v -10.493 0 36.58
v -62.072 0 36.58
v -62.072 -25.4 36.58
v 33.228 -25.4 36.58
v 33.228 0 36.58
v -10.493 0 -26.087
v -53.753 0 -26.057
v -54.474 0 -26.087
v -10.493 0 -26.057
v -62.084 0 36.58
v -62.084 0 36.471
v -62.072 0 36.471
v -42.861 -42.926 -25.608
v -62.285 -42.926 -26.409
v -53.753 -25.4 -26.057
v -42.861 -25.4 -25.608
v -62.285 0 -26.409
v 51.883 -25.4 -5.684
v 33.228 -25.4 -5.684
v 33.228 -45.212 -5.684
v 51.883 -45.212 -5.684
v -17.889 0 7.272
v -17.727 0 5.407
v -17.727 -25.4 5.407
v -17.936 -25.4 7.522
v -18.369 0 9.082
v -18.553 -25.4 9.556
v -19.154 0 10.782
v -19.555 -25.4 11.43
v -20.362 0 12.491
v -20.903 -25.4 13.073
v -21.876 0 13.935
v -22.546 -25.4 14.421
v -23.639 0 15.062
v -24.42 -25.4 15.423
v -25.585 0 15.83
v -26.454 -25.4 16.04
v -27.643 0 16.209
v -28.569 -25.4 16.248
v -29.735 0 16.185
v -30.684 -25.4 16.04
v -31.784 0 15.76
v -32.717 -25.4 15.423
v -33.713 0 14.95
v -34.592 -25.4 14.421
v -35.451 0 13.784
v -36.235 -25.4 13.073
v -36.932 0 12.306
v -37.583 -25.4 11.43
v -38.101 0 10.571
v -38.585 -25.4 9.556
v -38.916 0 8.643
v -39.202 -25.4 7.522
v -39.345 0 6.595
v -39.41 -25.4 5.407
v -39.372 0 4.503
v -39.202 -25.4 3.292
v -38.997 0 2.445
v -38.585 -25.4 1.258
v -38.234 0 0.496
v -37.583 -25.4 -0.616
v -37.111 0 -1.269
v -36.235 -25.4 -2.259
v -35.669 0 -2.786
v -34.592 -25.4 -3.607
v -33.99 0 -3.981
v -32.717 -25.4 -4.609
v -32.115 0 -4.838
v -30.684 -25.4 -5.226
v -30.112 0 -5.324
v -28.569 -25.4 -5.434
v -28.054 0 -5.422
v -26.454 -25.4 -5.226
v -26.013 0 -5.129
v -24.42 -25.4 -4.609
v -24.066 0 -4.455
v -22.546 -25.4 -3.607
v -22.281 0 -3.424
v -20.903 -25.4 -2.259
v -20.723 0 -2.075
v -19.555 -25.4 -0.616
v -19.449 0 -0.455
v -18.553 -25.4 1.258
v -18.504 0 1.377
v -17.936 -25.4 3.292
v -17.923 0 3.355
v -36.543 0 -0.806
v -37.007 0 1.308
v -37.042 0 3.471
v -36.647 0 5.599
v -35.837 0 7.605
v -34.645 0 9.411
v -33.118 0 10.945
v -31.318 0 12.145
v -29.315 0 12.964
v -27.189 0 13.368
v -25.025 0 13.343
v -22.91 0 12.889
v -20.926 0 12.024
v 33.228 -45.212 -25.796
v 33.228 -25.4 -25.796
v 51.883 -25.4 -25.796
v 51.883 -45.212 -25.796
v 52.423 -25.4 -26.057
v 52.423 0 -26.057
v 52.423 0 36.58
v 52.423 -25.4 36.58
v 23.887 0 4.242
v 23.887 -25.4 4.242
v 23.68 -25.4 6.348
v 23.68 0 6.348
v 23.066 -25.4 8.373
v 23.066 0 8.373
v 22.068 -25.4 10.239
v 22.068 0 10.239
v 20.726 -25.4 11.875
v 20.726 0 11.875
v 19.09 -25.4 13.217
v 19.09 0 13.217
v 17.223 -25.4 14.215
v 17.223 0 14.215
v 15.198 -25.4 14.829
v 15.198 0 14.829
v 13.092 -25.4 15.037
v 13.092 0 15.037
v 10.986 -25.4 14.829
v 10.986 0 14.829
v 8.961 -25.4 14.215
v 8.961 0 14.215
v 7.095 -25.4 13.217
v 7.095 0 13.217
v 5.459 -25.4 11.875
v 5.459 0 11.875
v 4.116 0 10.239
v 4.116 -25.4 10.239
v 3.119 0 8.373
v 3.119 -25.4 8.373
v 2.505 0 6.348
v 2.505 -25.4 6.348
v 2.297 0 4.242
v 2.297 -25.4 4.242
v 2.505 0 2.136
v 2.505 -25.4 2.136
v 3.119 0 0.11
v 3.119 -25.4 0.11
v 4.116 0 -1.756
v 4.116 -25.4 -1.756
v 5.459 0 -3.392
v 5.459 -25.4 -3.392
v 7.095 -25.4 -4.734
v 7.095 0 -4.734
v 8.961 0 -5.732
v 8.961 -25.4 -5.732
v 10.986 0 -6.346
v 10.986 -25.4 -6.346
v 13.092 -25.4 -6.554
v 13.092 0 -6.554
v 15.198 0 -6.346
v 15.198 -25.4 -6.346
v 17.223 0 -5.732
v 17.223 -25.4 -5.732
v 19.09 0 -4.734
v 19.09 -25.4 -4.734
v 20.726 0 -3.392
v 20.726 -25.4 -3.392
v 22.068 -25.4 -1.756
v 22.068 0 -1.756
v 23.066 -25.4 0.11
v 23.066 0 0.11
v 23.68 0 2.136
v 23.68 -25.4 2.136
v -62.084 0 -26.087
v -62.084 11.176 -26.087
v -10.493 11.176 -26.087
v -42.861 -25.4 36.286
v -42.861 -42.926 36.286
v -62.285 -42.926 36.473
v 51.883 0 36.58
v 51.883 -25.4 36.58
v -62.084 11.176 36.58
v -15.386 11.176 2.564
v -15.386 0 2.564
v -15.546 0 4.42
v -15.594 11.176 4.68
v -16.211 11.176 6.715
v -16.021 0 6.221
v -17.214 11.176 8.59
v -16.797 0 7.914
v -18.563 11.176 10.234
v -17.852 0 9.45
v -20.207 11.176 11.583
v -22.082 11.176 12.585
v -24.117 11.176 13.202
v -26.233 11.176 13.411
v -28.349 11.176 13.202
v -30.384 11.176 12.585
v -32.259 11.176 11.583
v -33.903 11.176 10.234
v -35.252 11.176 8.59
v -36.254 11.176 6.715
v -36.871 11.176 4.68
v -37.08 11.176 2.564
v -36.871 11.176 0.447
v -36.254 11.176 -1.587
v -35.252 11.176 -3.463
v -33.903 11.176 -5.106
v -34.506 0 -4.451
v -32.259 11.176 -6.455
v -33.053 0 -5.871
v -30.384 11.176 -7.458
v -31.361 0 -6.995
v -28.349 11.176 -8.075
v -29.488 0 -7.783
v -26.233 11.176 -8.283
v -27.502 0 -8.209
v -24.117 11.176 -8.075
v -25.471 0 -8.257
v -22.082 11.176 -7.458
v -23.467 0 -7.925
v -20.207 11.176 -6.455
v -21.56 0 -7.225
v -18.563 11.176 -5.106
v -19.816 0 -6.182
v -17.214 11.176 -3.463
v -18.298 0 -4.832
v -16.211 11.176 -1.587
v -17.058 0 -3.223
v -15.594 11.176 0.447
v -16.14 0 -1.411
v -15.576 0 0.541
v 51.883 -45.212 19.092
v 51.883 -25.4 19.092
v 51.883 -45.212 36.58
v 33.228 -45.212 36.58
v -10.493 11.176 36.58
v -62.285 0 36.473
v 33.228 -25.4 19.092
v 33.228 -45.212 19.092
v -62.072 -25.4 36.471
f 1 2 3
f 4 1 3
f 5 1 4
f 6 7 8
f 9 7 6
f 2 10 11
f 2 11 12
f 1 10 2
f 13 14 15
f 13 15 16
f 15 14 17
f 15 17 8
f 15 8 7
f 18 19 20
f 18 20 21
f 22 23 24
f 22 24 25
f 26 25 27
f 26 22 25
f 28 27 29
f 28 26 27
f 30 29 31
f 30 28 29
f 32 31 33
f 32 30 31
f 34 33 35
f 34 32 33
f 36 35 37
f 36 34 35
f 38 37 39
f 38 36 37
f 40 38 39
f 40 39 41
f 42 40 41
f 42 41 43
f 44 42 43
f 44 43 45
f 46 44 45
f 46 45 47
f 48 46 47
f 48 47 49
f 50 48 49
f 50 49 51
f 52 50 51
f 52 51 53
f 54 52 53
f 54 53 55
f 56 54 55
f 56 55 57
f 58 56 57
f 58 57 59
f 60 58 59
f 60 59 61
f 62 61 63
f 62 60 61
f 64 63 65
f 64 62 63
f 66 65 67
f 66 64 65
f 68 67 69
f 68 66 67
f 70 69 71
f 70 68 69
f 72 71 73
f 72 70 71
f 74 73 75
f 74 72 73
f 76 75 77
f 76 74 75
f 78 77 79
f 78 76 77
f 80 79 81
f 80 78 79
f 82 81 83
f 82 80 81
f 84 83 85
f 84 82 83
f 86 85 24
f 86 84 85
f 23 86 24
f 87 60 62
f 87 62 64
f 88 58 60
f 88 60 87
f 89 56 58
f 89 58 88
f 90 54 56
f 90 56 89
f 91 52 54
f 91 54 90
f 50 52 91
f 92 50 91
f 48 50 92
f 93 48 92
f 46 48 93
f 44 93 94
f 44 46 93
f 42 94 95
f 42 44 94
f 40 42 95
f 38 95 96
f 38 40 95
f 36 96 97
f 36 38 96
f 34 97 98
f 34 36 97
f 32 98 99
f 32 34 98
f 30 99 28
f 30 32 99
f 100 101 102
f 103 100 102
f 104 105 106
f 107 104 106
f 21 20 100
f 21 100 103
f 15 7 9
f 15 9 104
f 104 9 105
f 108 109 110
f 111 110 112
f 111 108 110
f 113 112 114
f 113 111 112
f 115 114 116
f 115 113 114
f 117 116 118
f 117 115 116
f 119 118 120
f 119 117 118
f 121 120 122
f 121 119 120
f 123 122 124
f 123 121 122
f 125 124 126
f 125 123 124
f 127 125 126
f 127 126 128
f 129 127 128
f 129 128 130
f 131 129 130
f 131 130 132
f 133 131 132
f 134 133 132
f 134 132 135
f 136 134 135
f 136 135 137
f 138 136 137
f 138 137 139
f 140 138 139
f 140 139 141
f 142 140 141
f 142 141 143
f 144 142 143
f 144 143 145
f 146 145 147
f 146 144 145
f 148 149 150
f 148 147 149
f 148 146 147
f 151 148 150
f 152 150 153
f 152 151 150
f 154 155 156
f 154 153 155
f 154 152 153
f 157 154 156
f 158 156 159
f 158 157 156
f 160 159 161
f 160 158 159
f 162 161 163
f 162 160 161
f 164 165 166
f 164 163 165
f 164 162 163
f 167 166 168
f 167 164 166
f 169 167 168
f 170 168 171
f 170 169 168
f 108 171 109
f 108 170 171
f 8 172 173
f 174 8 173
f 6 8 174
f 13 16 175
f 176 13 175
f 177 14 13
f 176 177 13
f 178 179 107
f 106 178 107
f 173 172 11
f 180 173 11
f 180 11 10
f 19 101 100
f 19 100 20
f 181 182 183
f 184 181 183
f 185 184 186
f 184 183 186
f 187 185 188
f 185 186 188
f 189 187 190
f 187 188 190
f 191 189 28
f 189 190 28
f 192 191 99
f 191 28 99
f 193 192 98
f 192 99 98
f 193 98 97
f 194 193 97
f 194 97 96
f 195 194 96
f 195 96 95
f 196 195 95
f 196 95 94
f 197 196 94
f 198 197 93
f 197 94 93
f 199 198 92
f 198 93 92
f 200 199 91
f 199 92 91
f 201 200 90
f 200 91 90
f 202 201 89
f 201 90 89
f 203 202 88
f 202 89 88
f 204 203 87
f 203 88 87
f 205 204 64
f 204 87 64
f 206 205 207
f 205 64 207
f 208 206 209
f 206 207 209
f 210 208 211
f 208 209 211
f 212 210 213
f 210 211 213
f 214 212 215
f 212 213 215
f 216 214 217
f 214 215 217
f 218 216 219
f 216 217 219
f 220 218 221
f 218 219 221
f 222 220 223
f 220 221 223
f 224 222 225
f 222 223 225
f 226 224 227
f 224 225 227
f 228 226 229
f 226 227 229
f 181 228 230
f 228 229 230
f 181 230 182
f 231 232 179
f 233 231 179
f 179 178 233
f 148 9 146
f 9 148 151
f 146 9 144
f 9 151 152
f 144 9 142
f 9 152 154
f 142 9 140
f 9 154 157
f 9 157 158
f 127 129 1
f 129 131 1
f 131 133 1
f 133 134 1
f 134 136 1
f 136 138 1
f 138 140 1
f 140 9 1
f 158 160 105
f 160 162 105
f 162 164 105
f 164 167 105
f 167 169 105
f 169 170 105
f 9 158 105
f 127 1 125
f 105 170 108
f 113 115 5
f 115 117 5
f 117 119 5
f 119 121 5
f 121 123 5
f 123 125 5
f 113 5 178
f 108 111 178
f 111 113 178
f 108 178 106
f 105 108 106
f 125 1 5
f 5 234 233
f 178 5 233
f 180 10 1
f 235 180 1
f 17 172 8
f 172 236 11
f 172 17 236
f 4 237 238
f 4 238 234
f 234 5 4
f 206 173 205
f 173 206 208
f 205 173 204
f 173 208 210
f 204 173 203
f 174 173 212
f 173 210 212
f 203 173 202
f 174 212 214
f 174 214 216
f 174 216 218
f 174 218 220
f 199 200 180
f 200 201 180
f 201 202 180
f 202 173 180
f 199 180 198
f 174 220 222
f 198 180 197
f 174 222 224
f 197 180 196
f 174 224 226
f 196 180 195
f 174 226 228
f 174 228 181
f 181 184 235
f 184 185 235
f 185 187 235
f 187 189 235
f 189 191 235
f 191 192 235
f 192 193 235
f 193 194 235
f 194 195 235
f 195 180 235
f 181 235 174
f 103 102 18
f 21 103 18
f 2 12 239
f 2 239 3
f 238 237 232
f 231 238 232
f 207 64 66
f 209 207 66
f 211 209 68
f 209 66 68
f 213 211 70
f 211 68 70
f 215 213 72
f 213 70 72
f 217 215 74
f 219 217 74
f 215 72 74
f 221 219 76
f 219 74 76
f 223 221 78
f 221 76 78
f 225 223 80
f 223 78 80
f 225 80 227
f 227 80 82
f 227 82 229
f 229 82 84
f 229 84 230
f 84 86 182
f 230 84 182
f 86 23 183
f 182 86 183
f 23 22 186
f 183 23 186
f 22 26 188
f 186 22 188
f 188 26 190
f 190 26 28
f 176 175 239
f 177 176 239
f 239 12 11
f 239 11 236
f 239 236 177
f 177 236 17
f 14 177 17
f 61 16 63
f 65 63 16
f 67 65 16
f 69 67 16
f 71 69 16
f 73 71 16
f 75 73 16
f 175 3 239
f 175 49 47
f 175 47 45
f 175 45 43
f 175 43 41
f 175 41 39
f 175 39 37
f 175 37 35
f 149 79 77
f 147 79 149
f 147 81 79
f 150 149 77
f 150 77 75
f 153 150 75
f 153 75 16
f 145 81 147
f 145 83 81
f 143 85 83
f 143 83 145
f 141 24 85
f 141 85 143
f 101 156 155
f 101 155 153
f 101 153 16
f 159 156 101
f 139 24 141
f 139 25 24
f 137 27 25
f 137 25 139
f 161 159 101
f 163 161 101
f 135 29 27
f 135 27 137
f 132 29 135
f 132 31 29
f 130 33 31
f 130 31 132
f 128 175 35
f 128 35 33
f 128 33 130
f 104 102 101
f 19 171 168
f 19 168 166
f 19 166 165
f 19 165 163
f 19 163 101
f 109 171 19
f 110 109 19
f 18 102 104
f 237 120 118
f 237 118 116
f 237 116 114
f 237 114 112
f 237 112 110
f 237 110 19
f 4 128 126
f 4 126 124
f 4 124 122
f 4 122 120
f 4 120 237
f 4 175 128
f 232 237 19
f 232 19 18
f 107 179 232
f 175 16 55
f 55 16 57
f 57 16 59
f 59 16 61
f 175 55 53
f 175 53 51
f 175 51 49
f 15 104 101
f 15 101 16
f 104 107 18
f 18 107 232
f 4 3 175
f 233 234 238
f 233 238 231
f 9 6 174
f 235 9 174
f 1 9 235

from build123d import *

# Parameters (mm, degrees)
F0_W      = 114.494712
F0_H      = 62.637055
F1_DEPTH  = 25.4
F2_R      = 10.795138
F2_R_2    = 10.841205
F2_R_3    = 10.79514
F3_DEPTH  = 116.84
F5_DEPTH  = 42.926
F6_W      = 51.59115
F6_H      = 62.667213
F7_DEPTH  = 11.176
F8_R      = 10.847006
F9_DEPTH  = 65.532
F10_W     = 18.654421
F10_H     = 20.111804
F10_W_2   = 18.65442
F10_H_2   = 17.488524
F11_DEPTH = 45.212


with BuildPart() as f1:
    # F0 (on Front) → F1 (new body)
    with BuildSketch(Plane.XZ):
        with Locations((-4.824847, 5.261216)):
            Rectangle(F0_W, F0_H)
    extrude(amount=F1_DEPTH)

    # F2 (on Front) → F3 (cut)
    with BuildSketch(Plane.XZ):
        with Locations((13.092266, 4.241542)):
            Circle(F2_R)
        with Locations((-28.568659, 5.406883)):
            Circle(F2_R_2)
        with Locations((-28.568659, 5.406883)):
            Circle(F2_R_3, mode=Mode.SUBTRACT)
        with Locations((-28.568659, 5.406883)):
            Circle(F2_R_3)
    extrude(amount=F3_DEPTH, mode=Mode.SUBTRACT)

    # F4 (on Front) → F5 (join)
    with BuildSketch(Plane.XZ):
        Polygon((-42.860791, -25.608312), (-42.860791, 36.285762), (-62.284995, 36.472697), (-62.284995, -26.409047), align=None)
    extrude(amount=F5_DEPTH)

    # F6 (on Front) → F7 (join)
    with BuildSketch(Plane.XZ):
        with Locations((-36.28869, 5.246557)):
            Rectangle(F6_W, F6_H)
    extrude(amount=-F7_DEPTH)

    # F8 (on Front) → F9 (cut)
    with BuildSketch(Plane.XZ):
        with Locations((-26.232786, 2.563626)):
            Circle(F8_R)
    extrude(amount=-F9_DEPTH, mode=Mode.SUBTRACT)

    # F10 (on Front) → F11 (join)
    with BuildSketch(Plane.XZ):
        with Locations((42.555411, -15.739673)):
            Rectangle(F10_W, F10_H)
        with Locations((42.55541, 27.835902)):
            Rectangle(F10_W_2, F10_H_2)
    extrude(amount=F11_DEPTH)


solid = f1.part
